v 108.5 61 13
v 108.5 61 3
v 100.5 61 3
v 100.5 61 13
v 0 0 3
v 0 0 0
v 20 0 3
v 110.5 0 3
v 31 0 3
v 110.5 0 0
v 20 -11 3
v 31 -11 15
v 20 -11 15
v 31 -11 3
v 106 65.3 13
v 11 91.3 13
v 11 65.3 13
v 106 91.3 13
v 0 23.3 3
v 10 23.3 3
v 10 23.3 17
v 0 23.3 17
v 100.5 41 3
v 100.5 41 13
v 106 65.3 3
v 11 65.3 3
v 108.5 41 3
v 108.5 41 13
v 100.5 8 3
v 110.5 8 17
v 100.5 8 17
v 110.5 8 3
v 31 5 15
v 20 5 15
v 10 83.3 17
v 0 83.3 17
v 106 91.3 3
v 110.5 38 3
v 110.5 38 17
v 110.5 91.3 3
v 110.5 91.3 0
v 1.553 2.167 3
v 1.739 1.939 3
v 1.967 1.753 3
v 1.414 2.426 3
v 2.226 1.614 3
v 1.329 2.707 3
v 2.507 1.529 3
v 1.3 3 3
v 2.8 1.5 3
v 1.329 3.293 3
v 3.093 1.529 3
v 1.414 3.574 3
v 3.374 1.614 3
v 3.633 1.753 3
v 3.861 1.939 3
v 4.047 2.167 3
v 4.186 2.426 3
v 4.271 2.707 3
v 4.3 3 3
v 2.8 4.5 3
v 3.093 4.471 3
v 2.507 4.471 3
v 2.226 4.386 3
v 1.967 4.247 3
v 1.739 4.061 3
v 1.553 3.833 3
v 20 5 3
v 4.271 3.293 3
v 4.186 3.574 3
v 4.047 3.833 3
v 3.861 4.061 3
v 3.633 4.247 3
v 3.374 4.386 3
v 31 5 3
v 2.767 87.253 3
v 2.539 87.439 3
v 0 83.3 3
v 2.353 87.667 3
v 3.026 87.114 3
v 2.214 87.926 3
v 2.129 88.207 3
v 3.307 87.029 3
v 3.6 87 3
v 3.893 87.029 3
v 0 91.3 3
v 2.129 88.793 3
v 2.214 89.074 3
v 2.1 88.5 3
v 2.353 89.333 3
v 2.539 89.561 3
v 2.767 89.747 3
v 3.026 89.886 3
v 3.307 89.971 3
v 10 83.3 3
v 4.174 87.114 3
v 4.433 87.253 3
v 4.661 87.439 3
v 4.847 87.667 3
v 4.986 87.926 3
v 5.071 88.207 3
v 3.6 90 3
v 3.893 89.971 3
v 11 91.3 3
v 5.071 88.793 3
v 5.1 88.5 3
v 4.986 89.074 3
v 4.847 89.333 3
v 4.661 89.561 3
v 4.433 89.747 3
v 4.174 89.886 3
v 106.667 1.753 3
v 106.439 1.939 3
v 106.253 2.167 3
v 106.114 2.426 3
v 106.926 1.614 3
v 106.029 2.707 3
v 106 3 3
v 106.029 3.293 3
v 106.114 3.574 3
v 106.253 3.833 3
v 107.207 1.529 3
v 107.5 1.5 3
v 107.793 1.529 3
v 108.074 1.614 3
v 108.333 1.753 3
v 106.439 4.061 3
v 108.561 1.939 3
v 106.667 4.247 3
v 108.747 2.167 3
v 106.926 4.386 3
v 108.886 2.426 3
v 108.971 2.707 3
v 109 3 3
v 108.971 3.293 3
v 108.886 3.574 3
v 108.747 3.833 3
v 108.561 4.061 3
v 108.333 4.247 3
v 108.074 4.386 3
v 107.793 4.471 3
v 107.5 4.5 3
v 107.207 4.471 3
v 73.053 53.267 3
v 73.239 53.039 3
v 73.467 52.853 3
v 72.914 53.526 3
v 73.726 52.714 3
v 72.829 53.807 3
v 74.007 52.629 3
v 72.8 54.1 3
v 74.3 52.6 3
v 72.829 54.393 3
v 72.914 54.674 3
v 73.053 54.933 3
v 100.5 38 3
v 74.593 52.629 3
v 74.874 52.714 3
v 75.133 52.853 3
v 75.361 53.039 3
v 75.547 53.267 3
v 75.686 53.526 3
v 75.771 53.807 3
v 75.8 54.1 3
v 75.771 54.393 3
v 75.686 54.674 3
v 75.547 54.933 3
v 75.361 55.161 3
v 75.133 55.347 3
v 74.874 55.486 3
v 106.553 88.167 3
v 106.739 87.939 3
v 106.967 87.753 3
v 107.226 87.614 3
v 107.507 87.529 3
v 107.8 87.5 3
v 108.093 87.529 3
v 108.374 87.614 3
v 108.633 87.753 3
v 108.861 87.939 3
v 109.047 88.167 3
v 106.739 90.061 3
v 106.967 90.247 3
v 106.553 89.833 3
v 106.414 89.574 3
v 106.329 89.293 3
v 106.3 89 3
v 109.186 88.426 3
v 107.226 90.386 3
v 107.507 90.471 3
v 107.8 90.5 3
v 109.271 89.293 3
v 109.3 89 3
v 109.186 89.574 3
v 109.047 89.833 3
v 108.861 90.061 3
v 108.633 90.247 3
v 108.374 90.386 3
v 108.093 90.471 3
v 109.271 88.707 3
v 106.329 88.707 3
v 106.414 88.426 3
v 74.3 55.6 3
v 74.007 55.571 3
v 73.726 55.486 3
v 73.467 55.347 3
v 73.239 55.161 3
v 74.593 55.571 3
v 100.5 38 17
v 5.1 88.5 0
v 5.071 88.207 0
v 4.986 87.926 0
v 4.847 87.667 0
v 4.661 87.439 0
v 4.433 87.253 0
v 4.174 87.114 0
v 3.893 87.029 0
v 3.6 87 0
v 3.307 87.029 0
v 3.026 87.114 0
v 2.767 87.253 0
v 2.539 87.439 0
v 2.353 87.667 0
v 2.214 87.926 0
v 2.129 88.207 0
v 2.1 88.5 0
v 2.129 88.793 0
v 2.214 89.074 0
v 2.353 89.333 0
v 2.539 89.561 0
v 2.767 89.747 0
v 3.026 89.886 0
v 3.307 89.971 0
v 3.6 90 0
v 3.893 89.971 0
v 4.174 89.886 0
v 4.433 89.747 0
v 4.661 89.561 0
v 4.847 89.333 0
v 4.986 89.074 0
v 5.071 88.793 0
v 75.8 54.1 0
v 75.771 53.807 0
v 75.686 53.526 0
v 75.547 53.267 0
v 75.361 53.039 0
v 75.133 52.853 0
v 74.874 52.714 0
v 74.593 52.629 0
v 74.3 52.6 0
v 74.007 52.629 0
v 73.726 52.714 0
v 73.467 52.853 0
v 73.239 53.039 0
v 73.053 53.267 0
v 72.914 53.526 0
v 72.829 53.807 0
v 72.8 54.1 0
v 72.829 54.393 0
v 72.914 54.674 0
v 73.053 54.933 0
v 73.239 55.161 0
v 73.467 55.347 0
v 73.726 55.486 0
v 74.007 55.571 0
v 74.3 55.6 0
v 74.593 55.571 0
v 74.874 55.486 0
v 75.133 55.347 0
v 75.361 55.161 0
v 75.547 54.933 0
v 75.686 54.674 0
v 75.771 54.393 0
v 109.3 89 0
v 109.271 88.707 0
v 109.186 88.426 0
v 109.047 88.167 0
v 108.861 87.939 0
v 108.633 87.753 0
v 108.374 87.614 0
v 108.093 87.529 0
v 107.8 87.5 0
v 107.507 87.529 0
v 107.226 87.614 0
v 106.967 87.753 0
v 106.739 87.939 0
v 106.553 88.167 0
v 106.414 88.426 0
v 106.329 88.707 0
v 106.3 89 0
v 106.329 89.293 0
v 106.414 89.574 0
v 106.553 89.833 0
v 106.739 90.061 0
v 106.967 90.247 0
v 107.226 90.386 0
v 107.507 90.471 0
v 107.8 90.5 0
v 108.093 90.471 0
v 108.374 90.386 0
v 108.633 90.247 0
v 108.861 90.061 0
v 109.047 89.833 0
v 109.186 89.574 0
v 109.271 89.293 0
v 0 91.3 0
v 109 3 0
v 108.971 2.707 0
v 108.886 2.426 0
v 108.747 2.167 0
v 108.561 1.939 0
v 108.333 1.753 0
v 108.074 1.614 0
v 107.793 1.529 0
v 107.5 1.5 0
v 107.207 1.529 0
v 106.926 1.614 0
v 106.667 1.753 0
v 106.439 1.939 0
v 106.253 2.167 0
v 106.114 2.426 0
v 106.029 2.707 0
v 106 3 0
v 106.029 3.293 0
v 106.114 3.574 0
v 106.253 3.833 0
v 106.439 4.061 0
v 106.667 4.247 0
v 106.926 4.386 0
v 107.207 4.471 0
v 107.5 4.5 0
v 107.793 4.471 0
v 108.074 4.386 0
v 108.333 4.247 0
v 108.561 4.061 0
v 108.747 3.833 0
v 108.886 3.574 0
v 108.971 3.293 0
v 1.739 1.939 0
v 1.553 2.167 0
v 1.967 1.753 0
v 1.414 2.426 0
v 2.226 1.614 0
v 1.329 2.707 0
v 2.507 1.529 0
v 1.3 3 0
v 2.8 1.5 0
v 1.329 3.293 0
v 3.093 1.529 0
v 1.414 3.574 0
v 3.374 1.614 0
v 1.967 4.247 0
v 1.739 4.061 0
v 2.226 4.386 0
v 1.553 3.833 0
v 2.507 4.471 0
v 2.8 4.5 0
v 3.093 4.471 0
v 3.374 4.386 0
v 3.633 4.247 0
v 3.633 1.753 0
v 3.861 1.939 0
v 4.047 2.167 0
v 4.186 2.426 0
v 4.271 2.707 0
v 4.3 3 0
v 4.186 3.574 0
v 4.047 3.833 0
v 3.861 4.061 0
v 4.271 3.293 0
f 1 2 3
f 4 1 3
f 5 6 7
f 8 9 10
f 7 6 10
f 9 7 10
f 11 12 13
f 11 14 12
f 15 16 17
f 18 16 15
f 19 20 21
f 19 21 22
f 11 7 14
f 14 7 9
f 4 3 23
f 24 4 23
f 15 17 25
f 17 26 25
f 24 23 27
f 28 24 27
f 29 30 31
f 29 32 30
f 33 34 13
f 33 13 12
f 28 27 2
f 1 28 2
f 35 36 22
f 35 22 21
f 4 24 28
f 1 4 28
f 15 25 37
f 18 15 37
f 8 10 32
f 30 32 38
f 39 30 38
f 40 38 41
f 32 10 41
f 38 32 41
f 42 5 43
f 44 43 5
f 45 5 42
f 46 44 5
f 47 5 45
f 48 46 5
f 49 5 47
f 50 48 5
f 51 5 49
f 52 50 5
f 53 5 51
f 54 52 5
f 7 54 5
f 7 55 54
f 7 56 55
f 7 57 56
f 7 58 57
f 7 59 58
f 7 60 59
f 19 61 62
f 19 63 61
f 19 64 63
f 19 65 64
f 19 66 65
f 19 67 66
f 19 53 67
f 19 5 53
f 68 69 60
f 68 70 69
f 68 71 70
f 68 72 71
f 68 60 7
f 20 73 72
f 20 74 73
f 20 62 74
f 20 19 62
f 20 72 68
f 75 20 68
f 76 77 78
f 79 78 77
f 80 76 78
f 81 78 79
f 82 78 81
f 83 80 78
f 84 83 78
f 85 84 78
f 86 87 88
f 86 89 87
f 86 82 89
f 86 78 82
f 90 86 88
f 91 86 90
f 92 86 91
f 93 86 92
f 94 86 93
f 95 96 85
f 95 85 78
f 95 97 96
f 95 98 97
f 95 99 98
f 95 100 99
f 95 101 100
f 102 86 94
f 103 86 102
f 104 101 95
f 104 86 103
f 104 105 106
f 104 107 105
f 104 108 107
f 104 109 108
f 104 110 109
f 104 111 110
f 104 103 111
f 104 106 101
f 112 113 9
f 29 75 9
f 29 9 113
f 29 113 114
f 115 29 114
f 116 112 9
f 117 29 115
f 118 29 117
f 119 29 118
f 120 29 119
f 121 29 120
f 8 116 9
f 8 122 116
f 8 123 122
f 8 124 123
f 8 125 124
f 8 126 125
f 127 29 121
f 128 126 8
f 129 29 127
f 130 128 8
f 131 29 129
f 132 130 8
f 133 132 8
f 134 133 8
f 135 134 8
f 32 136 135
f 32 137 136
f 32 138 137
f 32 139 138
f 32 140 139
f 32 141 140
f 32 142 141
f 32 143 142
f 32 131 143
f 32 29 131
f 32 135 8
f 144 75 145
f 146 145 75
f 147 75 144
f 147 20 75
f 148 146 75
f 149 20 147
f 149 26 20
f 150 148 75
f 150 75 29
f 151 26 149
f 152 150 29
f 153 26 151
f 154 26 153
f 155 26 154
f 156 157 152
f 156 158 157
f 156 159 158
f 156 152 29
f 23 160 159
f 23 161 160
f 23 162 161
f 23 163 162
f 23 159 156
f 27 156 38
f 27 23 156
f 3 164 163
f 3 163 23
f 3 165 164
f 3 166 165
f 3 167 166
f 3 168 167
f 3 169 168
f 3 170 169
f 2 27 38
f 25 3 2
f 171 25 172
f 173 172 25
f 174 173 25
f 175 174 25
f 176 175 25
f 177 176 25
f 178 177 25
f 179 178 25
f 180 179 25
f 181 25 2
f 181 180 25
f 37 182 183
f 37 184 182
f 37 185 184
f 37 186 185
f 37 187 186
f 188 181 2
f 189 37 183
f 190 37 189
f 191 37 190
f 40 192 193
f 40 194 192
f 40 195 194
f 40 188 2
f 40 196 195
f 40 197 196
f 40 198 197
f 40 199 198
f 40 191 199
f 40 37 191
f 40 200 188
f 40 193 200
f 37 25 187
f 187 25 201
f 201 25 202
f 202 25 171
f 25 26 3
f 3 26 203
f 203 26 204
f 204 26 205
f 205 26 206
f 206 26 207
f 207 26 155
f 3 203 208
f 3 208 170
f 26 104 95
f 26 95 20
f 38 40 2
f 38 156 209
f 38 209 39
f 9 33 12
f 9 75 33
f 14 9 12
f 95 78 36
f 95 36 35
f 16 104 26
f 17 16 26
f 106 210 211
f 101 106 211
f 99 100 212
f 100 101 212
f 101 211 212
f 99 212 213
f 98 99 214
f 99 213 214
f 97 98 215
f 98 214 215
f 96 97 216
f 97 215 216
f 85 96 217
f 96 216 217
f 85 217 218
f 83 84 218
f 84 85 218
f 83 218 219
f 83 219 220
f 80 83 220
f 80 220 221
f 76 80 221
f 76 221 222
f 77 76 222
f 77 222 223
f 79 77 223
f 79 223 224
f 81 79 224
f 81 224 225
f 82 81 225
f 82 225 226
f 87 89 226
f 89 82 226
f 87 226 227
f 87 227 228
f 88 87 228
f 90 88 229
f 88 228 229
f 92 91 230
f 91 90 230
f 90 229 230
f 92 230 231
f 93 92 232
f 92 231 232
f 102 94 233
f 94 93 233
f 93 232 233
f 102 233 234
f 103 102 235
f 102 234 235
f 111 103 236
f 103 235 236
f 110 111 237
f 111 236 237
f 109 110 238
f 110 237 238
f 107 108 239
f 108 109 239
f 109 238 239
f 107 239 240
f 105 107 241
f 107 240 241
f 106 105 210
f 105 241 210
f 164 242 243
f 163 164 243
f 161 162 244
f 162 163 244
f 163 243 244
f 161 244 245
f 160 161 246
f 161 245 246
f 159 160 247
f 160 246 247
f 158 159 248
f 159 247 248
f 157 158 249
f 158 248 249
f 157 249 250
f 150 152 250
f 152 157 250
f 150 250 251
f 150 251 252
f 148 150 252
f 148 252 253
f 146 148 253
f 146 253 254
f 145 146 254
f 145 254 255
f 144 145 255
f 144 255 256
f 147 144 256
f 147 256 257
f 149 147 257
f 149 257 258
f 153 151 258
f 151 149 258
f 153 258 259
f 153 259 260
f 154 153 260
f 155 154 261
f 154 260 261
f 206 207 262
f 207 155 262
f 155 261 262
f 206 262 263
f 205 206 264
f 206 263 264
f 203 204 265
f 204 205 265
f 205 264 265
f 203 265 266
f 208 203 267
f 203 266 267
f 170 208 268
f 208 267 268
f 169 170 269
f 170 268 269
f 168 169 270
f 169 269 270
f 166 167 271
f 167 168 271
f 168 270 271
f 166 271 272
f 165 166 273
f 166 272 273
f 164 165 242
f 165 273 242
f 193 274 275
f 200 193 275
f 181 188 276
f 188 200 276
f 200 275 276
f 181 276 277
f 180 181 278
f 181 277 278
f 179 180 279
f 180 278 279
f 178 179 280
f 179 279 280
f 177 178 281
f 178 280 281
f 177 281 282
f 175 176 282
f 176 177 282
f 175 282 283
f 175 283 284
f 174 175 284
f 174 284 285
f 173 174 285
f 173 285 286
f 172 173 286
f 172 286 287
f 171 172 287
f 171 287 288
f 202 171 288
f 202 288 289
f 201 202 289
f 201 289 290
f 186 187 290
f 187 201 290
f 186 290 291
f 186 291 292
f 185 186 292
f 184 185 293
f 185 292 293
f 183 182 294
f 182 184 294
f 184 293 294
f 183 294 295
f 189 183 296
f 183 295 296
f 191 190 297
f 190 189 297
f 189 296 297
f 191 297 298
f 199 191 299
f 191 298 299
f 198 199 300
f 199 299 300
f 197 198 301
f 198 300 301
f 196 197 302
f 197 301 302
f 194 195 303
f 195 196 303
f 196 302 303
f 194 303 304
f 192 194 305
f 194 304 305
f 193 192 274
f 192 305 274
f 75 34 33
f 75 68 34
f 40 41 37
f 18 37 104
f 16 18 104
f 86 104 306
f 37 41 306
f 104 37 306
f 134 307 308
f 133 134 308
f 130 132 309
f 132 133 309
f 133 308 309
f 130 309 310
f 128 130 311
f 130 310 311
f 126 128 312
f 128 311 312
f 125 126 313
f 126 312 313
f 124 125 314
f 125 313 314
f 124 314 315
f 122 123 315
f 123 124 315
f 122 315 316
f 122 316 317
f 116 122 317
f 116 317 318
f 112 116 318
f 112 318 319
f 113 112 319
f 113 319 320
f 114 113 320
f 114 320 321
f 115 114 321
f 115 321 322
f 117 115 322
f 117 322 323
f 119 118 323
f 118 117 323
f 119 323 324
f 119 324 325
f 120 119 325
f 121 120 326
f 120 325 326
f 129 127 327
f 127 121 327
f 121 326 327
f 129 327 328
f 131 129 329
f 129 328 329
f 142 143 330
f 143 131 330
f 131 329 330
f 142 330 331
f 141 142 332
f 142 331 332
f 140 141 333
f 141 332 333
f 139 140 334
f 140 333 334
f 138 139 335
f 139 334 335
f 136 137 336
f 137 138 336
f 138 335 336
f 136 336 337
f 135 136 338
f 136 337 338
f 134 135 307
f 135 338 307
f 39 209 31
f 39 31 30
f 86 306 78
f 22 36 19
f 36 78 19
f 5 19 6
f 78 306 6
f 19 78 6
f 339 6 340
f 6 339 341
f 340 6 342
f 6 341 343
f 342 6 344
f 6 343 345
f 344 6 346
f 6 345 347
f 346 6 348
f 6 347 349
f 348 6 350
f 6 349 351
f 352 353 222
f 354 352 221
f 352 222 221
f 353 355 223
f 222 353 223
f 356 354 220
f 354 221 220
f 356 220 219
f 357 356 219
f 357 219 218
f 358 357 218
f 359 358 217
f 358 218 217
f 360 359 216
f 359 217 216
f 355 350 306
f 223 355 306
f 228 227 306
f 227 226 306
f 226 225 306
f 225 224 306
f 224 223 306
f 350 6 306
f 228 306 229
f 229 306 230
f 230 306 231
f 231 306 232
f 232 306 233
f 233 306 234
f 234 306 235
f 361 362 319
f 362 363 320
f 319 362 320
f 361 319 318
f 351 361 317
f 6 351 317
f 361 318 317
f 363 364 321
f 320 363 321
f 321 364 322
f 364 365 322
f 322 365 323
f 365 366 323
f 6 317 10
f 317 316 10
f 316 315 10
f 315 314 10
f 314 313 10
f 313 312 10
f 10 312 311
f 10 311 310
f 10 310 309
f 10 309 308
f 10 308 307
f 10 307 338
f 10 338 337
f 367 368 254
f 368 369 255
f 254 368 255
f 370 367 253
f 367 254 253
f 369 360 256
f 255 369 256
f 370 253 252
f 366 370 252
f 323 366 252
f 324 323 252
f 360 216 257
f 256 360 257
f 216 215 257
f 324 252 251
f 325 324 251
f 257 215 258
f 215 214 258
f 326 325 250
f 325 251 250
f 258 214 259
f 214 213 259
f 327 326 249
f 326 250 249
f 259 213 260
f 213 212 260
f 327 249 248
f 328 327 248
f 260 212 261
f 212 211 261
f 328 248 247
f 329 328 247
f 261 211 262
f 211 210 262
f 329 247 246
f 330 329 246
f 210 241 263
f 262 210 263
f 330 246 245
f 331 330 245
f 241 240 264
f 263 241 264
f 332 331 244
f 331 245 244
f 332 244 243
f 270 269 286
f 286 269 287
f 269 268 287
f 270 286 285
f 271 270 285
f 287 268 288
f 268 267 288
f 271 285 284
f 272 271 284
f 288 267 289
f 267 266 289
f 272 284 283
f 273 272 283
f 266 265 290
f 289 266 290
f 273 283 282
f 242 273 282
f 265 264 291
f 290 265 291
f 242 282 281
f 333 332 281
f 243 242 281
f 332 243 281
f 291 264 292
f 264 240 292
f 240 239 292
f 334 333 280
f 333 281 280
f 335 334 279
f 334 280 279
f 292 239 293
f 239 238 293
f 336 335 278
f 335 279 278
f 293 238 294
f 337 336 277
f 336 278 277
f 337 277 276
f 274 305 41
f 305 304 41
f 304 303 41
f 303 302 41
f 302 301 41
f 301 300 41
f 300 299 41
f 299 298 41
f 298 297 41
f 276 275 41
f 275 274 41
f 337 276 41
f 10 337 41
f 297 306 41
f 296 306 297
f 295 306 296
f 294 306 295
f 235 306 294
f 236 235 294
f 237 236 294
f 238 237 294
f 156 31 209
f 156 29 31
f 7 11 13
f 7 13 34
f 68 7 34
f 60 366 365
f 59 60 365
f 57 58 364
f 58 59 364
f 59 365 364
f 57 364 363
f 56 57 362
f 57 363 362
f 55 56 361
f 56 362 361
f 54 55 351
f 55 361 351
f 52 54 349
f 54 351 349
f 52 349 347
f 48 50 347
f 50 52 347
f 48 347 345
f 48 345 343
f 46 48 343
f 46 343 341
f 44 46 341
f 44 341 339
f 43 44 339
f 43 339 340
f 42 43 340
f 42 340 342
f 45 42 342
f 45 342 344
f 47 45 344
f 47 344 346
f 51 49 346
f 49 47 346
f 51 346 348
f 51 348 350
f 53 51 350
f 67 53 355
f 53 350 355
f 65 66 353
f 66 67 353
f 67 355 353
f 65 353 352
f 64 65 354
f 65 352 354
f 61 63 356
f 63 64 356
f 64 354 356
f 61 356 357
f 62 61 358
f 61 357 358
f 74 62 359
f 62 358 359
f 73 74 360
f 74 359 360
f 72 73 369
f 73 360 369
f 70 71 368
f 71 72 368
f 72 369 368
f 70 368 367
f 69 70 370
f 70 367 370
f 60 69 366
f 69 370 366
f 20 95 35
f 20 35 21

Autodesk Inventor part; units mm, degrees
ref_plane "YZ Plane" through (0, 0, 0) normal (1, 0, 0) x (0, 1, 0)
ref_plane "XZ Plane" through (0, 0, 0) normal (0, 1, 0) x (-1, 0, 0)
ref_plane "XY Plane" through (0, 0, 0) normal (0, 0, 1) x (1, 0, 0)
sketch "Sketch1" plane through (0, 0, 0) normal (0, 0, 1) x (1, 0, 0)
  line L0 (0, 0) -> (110.5, 0)
  line L1 (110.5, 0) -> (110.5, 91.3)
  line L2 (110.5, 91.3) -> (0, 91.3)
  line L3 (0, 91.3) -> (0, 0)
  circle A0 centre (2.8, 3) radius 1.5
  circle A1 centre (74.3, 54.1) radius 1.5
  circle A2 centre (3.6, 88.5) radius 1.5
  circle A3 centre (107.5, 3) radius 1.5
  circle A4 centre (107.8, 89) radius 1.5
  dimension "d0" = 110.5
  dimension "d1" = 91.3
  dimension "d2" = 3
  dimension "d3" = 3
  dimension "d4" = 3
  dimension "d5" = 3
  dimension "d6" = 3
  dimension "d7" = 2.8
  dimension "d8" = 3
  dimension "d9" = 3.6
  dimension "d10" = 88.5
  dimension "d11" = 74.3
  dimension "d12" = 54.1
  dimension "d13" = 107.5
  dimension "d14" = 3
  dimension "d15" = 89
  dimension "d16" = 107.8
extrude "Extrusion1" add sketch "Sketch1" along normal blind 3
sketch "Sketch2" plane through (0, 0, 3) normal (0, 0, 1) x (1, 0, 0)
  line L0 (110.5, 91.3) -> (0, 91.3) projected
  line L1 (0, 91.3) -> (0, 0) projected
  line L2 (0, 83.3) -> (10, 83.3)
  line L3 (10, 83.3) -> (10, 23.3)
  line L4 (10, 23.3) -> (0, 23.3)
  line L5 (0, 23.3) -> (0, 83.3)
  dimension "d19" = 10
  dimension "d20" = 60
  dimension "d21" = 8
extrude "Extrusion2" add sketch "Sketch2" along normal blind 14
sketch "Sketch3" plane through (0, 0, 3) normal (0, 0, 1) x (1, 0, 0)
  line L0 (110.5, 0) -> (110.5, 91.3) projected
  line L1 (110.5, 91.3) -> (0, 91.3) projected
  line L2 (106, 91.3) -> (11, 91.3)
  line L3 (11, 91.3) -> (11, 65.3)
  line L4 (11, 65.3) -> (106, 65.3)
  line L5 (106, 65.3) -> (106, 91.3)
  dimension "d24" = 95
  dimension "d25" = 26
  dimension "d26" = 0
  dimension "d27" = 4.5
extrude "Extrusion3" add sketch "Sketch3" along normal blind 10
sketch "Sketch4" plane through (0, 0, 3) normal (0, 0, 1) x (1, 0, 0)
  line L0 (0, 23.3) -> (0, 0) projected
  line L1 (0, 0) -> (110.5, 0) projected
  line L2 (20, 5) -> (31, 5)
  line L3 (31, 5) -> (31, -11)
  line L4 (31, -11) -> (20, -11)
  line L5 (20, -11) -> (20, 5)
  dimension "d30" = 11
  dimension "d31" = 16
  dimension "d32" = 20
  dimension "d33" = 5
extrude "Extrusion4" add sketch "Sketch4" along normal blind 12
sketch "Sketch5" plane through (0, 0, 3) normal (0, 0, 1) x (1, 0, 0)
  line L0 (31, 0) -> (110.5, 0) projected
  line L1 (110.5, 0) -> (110.5, 91.3) projected
  line L2 (110.5, 8) -> (100.5, 8)
  line L3 (100.5, 8) -> (100.5, 38)
  line L4 (100.5, 38) -> (110.5, 38)
  line L5 (110.5, 38) -> (110.5, 8)
  dimension "d36" = 10
  dimension "d37" = 30
  dimension "d38" = 8
extrude "Extrusion5" add sketch "Sketch5" along normal blind 14
sketch "Sketch6" plane through (0, 0, 3) normal (0, 0, 1) x (1, 0, 0)
  line L0 (100.5, 38) -> (110.5, 38) projected
  line L1 (110.5, 38) -> (110.5, 91.3) projected
  line L2 (100.5, 41) -> (108.5, 41)
  line L3 (108.5, 41) -> (108.5, 61)
  line L4 (108.5, 61) -> (100.5, 61)
  line L5 (100.5, 61) -> (100.5, 41)
  dimension "d41" = 8
  dimension "d42" = 2
  dimension "d43" = 3
  dimension "d44" = 20
extrude "Extrusion6" add sketch "Sketch6" along normal blind 10
properties part number "Megatronics3.0"
